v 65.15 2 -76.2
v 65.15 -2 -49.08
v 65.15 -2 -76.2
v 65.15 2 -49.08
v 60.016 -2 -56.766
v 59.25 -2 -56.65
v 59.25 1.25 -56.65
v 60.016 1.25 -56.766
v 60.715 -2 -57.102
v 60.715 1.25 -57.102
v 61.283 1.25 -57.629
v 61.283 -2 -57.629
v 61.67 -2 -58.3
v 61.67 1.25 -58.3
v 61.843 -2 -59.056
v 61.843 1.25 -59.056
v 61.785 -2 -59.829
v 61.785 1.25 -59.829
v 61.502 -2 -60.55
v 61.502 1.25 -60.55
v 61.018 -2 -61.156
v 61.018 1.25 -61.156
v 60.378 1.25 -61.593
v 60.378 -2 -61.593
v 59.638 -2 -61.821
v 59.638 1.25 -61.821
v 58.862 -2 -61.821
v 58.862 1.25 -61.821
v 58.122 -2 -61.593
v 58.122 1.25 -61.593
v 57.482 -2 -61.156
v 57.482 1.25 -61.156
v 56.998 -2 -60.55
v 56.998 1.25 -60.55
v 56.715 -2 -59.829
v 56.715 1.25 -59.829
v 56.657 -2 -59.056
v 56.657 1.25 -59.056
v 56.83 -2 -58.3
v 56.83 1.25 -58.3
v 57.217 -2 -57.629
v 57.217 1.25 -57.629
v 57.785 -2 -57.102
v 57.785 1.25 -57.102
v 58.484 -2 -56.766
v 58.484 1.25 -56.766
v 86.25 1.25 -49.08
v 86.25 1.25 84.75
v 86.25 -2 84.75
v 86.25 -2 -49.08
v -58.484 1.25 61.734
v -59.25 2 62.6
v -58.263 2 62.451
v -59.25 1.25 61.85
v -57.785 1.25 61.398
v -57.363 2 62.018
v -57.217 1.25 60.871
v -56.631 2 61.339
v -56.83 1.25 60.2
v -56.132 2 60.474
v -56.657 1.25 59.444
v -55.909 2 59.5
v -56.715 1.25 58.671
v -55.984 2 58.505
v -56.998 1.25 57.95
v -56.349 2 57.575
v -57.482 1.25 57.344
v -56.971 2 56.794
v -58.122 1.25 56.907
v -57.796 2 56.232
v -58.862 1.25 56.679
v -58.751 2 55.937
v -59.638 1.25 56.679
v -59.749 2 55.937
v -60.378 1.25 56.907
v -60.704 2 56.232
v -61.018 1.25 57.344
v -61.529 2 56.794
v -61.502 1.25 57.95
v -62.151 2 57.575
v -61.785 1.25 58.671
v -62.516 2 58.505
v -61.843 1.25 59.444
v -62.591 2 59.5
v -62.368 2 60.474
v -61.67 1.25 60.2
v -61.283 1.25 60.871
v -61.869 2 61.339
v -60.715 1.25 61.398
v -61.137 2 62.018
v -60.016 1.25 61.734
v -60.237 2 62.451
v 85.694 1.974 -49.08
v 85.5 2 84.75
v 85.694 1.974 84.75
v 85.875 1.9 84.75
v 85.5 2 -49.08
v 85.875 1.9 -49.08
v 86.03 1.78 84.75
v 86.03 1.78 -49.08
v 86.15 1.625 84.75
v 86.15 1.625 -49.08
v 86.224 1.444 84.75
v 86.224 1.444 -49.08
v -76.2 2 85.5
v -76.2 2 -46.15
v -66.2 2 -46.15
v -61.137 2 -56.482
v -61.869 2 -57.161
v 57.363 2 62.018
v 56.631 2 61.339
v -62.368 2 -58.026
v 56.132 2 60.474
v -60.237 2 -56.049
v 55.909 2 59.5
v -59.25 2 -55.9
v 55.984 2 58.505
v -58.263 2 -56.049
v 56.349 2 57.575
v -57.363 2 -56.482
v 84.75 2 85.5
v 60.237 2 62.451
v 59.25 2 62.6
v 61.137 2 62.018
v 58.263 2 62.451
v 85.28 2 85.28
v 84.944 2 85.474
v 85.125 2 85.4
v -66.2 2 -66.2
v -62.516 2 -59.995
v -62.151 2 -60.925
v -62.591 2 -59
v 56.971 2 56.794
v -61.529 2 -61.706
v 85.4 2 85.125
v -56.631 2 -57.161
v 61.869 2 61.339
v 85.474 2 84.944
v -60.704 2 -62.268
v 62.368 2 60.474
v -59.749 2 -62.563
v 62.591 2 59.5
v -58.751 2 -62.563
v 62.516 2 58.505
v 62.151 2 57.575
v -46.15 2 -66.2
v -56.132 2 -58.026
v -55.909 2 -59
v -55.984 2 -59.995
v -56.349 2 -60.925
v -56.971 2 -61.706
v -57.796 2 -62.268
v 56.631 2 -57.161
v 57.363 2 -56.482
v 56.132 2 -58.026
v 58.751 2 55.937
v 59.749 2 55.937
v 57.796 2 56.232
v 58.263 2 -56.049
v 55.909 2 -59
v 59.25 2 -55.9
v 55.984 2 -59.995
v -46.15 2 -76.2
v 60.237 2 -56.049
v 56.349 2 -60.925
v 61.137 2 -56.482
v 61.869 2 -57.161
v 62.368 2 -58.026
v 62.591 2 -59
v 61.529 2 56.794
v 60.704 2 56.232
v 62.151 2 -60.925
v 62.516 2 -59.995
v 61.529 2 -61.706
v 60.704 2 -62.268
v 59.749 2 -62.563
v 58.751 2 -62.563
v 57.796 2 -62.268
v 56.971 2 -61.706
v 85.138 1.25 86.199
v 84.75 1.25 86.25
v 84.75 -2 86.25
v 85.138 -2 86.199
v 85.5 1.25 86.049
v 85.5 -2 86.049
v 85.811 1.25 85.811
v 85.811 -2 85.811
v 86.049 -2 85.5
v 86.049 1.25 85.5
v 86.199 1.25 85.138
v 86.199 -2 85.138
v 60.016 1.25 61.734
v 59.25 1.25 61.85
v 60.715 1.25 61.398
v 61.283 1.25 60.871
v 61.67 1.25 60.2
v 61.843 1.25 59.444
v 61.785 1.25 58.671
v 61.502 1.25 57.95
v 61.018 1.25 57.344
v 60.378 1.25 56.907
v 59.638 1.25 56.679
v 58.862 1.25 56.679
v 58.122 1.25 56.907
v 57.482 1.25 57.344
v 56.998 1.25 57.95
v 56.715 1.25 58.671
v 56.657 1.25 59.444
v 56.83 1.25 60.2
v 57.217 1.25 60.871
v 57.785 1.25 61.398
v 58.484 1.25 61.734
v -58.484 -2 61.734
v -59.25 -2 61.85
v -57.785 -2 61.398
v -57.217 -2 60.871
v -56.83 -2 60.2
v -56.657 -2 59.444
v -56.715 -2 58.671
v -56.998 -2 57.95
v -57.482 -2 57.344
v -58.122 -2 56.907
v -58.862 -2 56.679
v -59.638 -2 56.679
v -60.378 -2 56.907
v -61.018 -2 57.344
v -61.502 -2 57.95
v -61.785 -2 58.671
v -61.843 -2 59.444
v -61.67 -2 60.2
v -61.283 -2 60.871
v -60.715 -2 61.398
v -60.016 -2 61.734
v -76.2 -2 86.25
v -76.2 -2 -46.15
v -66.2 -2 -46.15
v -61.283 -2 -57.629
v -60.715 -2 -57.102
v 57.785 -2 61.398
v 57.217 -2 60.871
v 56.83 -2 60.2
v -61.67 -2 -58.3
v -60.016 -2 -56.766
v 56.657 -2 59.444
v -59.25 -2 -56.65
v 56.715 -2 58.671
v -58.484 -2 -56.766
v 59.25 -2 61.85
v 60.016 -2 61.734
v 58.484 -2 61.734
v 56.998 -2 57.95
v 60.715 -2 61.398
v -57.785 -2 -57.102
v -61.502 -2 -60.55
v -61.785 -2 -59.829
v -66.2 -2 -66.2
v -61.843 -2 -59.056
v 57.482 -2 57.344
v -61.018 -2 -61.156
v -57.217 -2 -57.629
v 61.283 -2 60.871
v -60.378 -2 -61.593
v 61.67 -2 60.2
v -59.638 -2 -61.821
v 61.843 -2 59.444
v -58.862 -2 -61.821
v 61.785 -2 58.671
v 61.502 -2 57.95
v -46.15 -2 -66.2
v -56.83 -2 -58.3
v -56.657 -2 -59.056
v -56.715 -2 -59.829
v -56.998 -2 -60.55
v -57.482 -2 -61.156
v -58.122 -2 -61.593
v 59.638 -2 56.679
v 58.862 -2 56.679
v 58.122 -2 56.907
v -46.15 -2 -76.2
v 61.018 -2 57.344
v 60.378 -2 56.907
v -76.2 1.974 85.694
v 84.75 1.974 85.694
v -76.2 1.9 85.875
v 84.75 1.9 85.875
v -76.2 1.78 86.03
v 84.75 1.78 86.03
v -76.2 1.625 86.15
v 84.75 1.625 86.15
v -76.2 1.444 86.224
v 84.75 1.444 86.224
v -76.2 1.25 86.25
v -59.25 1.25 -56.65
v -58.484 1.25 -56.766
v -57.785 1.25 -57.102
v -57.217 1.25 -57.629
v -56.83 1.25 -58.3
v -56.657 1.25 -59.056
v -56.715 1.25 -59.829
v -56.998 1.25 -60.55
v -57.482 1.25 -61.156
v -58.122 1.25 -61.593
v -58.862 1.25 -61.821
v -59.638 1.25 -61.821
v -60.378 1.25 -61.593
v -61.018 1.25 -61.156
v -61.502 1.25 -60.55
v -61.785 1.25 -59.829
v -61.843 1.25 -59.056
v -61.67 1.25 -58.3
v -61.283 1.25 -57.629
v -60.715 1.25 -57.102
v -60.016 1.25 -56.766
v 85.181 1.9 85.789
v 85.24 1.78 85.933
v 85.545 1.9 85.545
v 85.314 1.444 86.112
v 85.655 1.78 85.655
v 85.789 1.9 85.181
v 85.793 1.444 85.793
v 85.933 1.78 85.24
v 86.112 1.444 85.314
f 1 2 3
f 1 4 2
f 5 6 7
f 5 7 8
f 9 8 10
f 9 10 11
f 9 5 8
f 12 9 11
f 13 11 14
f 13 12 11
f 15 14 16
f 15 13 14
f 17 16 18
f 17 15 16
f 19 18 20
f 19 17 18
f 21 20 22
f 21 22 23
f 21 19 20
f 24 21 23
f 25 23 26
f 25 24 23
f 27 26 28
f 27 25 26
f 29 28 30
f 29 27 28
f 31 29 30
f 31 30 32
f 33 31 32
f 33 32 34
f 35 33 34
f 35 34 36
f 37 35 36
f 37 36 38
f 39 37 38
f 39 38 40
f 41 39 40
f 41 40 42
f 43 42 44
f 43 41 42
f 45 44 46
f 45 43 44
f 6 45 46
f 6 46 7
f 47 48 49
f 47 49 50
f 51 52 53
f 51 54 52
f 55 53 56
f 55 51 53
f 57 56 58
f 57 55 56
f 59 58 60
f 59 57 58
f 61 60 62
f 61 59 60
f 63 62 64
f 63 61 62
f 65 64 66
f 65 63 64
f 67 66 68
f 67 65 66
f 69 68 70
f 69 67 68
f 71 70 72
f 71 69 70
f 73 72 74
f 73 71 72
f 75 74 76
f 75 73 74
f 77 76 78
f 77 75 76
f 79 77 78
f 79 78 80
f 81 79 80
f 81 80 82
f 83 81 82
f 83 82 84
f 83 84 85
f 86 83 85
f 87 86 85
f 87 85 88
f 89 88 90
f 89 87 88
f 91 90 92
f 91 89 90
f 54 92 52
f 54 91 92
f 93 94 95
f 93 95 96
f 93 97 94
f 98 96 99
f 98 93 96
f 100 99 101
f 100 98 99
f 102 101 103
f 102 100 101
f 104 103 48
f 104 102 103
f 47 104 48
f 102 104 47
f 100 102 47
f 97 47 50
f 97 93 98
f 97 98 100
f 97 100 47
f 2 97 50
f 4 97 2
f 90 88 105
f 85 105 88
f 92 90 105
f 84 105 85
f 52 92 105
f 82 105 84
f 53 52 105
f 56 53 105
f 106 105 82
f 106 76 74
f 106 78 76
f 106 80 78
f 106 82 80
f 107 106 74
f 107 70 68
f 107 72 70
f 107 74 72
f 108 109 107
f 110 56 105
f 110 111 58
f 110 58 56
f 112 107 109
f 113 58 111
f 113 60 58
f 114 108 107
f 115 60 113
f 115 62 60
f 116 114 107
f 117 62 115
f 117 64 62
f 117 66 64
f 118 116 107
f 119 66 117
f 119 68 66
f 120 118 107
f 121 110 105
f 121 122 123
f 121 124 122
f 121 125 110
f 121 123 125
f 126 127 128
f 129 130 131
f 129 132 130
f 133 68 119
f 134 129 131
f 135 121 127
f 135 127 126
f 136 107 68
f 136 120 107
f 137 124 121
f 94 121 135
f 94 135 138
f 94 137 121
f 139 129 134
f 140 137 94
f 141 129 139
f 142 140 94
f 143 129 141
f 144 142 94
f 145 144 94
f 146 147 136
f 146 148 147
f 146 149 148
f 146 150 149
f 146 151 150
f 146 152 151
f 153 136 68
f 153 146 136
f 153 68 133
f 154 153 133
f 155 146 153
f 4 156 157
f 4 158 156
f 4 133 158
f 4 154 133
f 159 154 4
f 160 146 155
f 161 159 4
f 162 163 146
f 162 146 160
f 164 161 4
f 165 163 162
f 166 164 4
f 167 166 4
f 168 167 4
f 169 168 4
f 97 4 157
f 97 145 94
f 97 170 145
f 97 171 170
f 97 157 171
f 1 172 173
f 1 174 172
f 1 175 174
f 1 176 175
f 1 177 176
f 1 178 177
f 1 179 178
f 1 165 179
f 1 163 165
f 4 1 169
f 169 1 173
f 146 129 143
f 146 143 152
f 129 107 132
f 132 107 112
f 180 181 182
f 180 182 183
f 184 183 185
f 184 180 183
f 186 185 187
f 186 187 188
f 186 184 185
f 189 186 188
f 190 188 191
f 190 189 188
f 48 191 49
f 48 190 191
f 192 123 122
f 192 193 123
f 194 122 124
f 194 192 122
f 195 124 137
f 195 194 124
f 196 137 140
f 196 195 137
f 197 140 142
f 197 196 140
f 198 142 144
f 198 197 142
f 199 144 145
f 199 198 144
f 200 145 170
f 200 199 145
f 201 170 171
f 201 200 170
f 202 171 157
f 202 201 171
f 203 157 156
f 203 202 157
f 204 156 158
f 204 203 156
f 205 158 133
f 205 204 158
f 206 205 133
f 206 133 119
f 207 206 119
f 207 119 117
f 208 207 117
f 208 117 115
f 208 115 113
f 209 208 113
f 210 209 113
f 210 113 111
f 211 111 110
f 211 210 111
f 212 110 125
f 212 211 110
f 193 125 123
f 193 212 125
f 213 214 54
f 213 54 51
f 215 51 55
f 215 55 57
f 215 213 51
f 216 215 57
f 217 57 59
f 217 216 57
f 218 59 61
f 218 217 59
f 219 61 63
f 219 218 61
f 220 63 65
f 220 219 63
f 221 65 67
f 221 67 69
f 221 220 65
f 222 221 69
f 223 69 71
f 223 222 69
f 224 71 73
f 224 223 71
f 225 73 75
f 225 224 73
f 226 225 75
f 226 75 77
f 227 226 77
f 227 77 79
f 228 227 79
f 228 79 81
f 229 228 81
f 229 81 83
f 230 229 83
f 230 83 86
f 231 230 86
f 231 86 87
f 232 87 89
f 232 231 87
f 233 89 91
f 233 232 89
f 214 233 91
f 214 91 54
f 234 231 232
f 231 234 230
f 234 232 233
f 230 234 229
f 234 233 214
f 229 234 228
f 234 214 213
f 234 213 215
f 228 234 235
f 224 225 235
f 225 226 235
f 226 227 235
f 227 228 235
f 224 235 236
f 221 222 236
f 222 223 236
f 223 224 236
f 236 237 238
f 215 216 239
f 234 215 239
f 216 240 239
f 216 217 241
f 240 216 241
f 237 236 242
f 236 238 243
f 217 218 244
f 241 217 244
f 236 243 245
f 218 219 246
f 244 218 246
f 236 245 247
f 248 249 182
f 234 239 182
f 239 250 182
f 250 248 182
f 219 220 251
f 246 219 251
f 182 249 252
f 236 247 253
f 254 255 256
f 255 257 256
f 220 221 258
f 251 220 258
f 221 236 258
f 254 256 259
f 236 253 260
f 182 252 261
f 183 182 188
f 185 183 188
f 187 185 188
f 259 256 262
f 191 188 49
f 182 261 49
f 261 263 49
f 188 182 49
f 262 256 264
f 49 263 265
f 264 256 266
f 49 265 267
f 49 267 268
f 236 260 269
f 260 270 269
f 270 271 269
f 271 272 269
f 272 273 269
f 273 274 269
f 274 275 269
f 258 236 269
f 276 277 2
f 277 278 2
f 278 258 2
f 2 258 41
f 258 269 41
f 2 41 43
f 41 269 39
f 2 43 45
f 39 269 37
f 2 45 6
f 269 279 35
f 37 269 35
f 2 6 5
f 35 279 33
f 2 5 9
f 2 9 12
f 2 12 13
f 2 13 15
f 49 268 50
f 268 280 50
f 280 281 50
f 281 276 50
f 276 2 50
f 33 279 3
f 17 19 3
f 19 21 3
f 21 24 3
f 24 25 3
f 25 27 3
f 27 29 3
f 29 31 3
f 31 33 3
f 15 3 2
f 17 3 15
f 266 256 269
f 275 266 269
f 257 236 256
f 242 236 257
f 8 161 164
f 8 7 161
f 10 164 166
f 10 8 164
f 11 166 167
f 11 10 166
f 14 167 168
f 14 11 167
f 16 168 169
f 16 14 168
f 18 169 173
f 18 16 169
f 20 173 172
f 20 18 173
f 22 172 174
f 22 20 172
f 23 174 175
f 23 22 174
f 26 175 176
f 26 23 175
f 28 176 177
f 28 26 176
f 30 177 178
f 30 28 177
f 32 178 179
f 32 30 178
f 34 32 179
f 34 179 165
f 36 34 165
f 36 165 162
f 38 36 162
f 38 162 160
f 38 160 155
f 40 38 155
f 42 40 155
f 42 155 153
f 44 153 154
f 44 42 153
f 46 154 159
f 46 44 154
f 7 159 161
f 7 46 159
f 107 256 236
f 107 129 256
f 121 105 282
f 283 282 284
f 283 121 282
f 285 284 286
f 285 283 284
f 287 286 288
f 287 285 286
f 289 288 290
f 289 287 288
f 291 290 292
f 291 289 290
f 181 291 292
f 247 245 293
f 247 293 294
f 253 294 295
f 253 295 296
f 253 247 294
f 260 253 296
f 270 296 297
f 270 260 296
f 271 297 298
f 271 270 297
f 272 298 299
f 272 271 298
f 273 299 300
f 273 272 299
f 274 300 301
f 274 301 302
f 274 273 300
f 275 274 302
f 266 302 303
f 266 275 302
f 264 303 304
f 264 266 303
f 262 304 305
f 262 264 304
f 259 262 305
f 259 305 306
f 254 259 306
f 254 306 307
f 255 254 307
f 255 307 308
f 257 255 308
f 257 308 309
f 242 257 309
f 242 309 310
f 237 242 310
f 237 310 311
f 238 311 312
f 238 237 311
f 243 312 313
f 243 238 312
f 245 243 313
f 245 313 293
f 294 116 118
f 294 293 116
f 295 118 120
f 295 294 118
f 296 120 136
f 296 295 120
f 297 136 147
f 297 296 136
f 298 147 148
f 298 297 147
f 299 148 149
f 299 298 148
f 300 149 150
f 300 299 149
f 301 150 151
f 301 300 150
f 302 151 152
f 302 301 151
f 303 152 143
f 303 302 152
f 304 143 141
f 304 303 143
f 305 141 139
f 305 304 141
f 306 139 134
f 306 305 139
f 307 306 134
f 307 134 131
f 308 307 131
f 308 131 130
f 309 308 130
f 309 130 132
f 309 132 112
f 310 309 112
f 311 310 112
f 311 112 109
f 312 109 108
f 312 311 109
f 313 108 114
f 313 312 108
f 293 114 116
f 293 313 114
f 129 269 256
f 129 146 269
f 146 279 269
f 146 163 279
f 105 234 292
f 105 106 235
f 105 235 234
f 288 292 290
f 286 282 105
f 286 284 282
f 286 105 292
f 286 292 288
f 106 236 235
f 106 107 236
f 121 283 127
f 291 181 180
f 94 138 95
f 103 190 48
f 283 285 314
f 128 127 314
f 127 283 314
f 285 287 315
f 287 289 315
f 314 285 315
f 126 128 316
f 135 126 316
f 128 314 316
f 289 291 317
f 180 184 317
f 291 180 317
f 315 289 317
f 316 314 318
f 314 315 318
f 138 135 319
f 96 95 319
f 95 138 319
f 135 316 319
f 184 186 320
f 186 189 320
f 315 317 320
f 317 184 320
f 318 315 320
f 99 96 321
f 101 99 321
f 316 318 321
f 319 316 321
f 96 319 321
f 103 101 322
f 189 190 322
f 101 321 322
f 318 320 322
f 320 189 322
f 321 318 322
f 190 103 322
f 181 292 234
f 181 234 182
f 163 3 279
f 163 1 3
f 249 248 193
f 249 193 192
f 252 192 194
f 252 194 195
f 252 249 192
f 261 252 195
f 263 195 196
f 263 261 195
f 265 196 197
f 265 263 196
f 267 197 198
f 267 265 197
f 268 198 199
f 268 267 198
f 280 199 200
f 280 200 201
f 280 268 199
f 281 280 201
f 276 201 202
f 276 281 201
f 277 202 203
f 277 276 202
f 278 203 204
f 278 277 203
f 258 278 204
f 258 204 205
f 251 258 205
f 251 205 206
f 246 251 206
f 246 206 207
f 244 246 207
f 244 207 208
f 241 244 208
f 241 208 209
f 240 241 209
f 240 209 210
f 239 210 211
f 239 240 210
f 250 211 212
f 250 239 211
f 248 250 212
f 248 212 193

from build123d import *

# Parameters (mm, degrees)
SKETCH1_R           = 1.85
BOSS_EXTRUDE1_DEPTH = 2
CHAMFER2_SIZE       = 1.5
CUT_EXTRUDE2_START  = -2
SKETCH1_4_R         = 2.6
SKETCH1_4_R_2       = 1.85
CUT_EXTRUDE2_DEPTH  = 3.25
FILLET1_R           = 0.75


with BuildPart() as part:
    # Sketch1 → Boss-Extrude1 (new, symmetric)
    with BuildSketch(Plane(origin=(0, 0, 0), x_dir=(1, 0, 0), z_dir=(0, 1, 0))):
        with BuildLine():
            Line((-66.2, 46.15), (-76.2, 46.15))
            Line((-76.2, 46.15), (-76.2, -86.25))
            Line((-76.2, -86.25), (84.75, -86.25))
            ThreePointArc((84.75, -86.25), (85.810660172, -85.810660172), (86.25, -84.75))
            Line((86.25, -84.75), (86.25, 49.08))
            Line((86.25, 49.08), (65.15, 49.08))
            Line((65.15, 49.08), (65.15, 76.2))
            Line((65.15, 76.2), (-46.15, 76.2))
            Line((-46.15, 76.2), (-46.15, 66.2))
            Line((-46.15, 66.2), (-66.2, 66.2))
            Line((-66.2, 66.2), (-66.2, 46.15))
        make_face()
        with Locations(Location((-59.25, 59.25, 0), (0, 0, 270))):
            Circle(SKETCH1_R, mode=Mode.SUBTRACT)
        with Locations(Location((-59.25, -59.25, 0), (0, 0, 270))):
            Circle(SKETCH1_R, mode=Mode.SUBTRACT)
        with Locations(Location((59.25, -59.25, 0), (0, 0, 270))):
            Circle(SKETCH1_R, mode=Mode.SUBTRACT)
        with Locations(Location((59.25, 59.25, 0), (0, 0, 270))):
            Circle(SKETCH1_R, mode=Mode.SUBTRACT)
    extrude(amount=BOSS_EXTRUDE1_DEPTH, both=True)

    # Chamfer2
    chamfer2_edges = [part.edges().sort_by_distance(p)[0] for p in [
        (-59.25, 2, -61.1),
        (59.25, 2, -61.1),
        (59.25, 2, 57.4),
        (-59.25, 2, 57.4),
    ]]
    chamfer(chamfer2_edges, length=CHAMFER2_SIZE)

    # Sketch1<4> → Cut-Extrude2 (cut)
    # profile 1 of 4: a face of its own
    with BuildSketch(Plane(origin=(0, 0, 0), x_dir=(1, 0, 0), z_dir=(0, 1, 0)).offset(CUT_EXTRUDE2_START)):
        with Locations(Location((-59.25, 59.25, 0), (0, 0, 270))):
            Circle(SKETCH1_4_R)
        with Locations((-59.25, 59.25)):
            Circle(SKETCH1_4_R_2, mode=Mode.SUBTRACT)
    # profile 2 of 4: a face of its own
    with BuildSketch(Plane(origin=(0, 0, 0), x_dir=(1, 0, 0), z_dir=(0, 1, 0)).offset(CUT_EXTRUDE2_START)):
        with Locations(Location((-59.25, -59.25, 0), (0, 0, 270))):
            Circle(SKETCH1_4_R)
        with Locations((-59.25, -59.25)):
            Circle(SKETCH1_4_R_2, mode=Mode.SUBTRACT)
    # profile 3 of 4: a face of its own
    with BuildSketch(Plane(origin=(0, 0, 0), x_dir=(1, 0, 0), z_dir=(0, 1, 0)).offset(CUT_EXTRUDE2_START)):
        with Locations(Location((59.25, -59.25, 0), (0, 0, 270))):
            Circle(SKETCH1_4_R)
        with Locations((59.25, -59.25)):
            Circle(SKETCH1_4_R_2, mode=Mode.SUBTRACT)
    # profile 4 of 4: a face of its own
    with BuildSketch(Plane(origin=(0, 0, 0), x_dir=(1, 0, 0), z_dir=(0, 1, 0)).offset(CUT_EXTRUDE2_START)):
        with Locations(Location((59.25, 59.25, 0), (0, 0, 270))):
            Circle(SKETCH1_4_R)
        with Locations((59.25, 59.25)):
            Circle(SKETCH1_4_R_2, mode=Mode.SUBTRACT)
    extrude(amount=CUT_EXTRUDE2_DEPTH, mode=Mode.SUBTRACT)

    # Fillet1
    fillet1_edges = [part.edges().sort_by_distance(p)[0] for p in [
        (86.25, 2, 17.835),
        (4.275, 2, 86.25),
        (85.810660172, 2, 85.810660172),
    ]]
    fillet(fillet1_edges, radius=FILLET1_R)


solid = part.part
